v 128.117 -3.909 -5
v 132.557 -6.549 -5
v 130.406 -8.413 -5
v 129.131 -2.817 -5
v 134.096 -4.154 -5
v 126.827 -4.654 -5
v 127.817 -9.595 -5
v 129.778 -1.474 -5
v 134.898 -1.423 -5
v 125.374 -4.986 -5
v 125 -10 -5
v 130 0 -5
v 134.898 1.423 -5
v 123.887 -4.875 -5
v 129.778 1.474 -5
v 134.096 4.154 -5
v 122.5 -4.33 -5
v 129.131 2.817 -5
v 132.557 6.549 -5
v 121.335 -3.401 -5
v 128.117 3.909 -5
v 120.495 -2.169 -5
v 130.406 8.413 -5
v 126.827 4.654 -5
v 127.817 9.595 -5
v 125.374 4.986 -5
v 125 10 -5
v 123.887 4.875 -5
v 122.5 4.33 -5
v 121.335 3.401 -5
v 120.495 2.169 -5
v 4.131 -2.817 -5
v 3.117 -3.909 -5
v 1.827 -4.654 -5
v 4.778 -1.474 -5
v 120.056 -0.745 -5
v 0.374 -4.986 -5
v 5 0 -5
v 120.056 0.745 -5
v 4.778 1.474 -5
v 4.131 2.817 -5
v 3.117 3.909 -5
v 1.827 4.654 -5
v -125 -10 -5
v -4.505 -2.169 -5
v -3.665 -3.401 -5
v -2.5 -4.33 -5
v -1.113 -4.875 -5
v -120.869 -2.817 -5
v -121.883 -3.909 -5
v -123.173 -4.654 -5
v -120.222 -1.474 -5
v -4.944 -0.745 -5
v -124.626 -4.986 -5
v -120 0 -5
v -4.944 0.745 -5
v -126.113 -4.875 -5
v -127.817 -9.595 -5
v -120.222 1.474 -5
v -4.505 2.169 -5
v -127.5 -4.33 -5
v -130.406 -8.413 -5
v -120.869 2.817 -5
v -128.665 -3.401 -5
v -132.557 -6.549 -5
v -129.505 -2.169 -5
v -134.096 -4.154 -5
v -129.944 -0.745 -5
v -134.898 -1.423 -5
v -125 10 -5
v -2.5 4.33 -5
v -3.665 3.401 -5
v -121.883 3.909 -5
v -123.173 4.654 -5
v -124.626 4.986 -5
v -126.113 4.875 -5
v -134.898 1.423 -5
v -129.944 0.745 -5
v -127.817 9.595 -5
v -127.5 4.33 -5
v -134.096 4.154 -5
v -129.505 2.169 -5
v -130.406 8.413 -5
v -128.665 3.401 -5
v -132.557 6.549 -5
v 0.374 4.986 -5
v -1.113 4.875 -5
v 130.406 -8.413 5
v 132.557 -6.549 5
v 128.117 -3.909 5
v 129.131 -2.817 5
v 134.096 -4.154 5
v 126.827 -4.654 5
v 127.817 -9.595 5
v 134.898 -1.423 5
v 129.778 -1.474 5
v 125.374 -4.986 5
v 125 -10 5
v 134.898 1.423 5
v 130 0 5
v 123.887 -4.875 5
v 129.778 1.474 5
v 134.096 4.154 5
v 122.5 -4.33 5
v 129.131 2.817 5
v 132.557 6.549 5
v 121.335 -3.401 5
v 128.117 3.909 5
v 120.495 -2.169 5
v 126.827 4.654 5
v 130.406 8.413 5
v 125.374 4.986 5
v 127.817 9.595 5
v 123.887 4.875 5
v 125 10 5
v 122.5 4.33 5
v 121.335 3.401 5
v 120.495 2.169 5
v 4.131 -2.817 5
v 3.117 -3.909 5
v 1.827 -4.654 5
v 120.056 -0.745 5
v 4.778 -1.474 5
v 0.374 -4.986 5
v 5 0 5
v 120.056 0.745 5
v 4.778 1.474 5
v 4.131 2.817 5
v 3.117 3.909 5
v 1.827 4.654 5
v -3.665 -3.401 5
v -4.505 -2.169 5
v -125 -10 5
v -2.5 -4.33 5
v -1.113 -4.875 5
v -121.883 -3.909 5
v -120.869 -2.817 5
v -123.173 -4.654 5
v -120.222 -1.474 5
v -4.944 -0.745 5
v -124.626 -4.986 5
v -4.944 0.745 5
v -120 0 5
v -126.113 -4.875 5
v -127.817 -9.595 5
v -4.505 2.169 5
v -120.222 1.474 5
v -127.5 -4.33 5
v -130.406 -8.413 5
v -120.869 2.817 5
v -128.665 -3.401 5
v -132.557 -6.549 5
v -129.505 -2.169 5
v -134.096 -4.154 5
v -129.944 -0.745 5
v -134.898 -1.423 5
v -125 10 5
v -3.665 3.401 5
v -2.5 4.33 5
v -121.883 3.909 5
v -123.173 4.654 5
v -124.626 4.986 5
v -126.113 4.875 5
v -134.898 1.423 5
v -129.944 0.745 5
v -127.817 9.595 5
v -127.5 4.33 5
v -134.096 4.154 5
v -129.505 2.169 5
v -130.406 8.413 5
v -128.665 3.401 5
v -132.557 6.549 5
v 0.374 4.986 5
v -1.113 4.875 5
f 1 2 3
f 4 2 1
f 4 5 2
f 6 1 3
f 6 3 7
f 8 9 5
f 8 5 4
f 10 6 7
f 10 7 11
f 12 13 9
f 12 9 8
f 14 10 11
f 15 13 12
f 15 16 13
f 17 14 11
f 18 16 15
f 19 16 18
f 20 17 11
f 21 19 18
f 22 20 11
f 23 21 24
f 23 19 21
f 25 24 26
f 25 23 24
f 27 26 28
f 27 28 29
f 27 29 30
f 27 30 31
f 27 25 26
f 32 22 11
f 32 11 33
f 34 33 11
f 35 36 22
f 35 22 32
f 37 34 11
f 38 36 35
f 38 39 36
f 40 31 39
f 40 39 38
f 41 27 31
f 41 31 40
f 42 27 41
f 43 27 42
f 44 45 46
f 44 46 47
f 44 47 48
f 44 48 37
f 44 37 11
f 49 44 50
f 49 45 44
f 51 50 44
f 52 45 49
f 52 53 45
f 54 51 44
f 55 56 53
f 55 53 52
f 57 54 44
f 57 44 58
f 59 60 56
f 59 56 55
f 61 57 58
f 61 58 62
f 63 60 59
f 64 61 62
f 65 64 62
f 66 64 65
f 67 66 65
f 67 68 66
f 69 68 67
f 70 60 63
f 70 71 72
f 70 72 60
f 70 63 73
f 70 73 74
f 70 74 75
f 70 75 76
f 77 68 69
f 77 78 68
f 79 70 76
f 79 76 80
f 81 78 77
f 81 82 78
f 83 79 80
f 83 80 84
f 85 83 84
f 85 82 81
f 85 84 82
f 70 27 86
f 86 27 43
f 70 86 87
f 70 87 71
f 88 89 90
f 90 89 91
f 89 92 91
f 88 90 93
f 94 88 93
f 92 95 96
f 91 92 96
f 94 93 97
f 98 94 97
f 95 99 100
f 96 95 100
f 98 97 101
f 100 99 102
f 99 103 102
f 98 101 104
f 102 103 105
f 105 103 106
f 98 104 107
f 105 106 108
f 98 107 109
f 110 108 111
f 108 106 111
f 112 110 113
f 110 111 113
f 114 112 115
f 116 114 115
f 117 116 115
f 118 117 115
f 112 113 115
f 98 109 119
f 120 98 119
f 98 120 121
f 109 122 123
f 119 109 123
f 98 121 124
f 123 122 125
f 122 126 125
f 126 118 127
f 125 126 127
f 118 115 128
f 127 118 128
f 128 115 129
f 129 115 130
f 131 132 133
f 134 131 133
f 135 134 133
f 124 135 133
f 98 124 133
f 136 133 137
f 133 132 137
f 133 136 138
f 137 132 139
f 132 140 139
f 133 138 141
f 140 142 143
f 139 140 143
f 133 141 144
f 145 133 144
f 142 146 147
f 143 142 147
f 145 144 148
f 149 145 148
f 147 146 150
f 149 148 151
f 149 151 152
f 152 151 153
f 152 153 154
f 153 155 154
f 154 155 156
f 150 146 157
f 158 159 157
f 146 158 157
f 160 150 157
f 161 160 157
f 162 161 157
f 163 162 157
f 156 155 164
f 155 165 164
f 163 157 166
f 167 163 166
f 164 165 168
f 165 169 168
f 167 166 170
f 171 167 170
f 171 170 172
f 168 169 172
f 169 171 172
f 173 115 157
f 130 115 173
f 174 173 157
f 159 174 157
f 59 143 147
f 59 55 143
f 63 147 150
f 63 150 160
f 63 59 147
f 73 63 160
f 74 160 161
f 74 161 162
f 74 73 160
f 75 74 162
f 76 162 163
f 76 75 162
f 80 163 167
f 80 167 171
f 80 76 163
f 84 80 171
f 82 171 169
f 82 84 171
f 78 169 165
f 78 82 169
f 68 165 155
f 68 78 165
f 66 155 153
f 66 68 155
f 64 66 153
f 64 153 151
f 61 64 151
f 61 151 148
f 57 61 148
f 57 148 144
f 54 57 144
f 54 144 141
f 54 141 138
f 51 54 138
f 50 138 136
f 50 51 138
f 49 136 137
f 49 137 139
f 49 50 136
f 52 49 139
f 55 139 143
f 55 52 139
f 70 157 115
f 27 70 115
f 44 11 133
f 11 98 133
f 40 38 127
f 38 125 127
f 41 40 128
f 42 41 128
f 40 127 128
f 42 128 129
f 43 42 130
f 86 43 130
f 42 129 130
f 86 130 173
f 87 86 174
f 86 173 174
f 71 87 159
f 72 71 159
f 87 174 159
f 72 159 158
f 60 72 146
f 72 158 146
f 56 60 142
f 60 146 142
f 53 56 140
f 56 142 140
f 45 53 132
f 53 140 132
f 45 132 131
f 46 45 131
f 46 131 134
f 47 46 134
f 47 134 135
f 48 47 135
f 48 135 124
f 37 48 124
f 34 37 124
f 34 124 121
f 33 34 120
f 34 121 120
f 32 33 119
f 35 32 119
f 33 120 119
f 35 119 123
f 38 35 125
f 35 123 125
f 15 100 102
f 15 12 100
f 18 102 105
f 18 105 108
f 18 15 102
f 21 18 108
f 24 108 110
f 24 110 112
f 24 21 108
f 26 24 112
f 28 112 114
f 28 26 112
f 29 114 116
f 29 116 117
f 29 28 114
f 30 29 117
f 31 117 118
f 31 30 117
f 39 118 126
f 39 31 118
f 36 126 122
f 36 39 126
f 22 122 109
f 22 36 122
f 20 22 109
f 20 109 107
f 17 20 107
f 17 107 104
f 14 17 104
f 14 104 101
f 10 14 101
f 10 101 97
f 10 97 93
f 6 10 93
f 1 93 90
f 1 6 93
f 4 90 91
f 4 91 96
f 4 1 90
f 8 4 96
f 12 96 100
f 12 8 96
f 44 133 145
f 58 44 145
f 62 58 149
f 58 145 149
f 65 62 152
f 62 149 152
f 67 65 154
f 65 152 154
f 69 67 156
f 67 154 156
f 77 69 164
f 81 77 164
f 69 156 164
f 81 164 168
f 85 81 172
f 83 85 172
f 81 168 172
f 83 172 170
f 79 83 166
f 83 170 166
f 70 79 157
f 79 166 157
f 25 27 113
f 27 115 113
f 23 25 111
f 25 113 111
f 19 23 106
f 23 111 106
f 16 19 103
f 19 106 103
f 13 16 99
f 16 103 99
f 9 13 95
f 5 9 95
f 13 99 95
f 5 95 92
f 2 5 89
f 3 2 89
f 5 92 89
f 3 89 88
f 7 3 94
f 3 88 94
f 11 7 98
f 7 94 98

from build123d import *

# Parameters (mm, degrees)
SKETCH1_R           = 5
BOSS_EXTRUDE1_DEPTH = 5
SKETCH2_R           = 5
CUT_EXTRUDE2_DEPTH  = 5


with BuildPart() as part:
    # Sketch1 → Boss-Extrude1 (new, symmetric)
    with BuildSketch(Plane.XY):
        with BuildLine():
            Line((-125, 10), (125, 10))
            ThreePointArc((125, 10), (135, 0), (125, -10))
            Line((125, -10), (-125, -10))
            ThreePointArc((-125, -10), (-135, 0), (-125, 10))
        make_face()
        with Locations((-125, 0)):
            Circle(SKETCH1_R, mode=Mode.SUBTRACT)
        with Locations((125, 0)):
            Circle(SKETCH1_R, mode=Mode.SUBTRACT)
    extrude(amount=BOSS_EXTRUDE1_DEPTH, both=True)

    # Sketch2 → Cut-Extrude2 (cut, symmetric)
    with BuildSketch(Plane.XY):
        Circle(SKETCH2_R)
    extrude(amount=CUT_EXTRUDE2_DEPTH, both=True, mode=Mode.SUBTRACT)


solid = part.part
